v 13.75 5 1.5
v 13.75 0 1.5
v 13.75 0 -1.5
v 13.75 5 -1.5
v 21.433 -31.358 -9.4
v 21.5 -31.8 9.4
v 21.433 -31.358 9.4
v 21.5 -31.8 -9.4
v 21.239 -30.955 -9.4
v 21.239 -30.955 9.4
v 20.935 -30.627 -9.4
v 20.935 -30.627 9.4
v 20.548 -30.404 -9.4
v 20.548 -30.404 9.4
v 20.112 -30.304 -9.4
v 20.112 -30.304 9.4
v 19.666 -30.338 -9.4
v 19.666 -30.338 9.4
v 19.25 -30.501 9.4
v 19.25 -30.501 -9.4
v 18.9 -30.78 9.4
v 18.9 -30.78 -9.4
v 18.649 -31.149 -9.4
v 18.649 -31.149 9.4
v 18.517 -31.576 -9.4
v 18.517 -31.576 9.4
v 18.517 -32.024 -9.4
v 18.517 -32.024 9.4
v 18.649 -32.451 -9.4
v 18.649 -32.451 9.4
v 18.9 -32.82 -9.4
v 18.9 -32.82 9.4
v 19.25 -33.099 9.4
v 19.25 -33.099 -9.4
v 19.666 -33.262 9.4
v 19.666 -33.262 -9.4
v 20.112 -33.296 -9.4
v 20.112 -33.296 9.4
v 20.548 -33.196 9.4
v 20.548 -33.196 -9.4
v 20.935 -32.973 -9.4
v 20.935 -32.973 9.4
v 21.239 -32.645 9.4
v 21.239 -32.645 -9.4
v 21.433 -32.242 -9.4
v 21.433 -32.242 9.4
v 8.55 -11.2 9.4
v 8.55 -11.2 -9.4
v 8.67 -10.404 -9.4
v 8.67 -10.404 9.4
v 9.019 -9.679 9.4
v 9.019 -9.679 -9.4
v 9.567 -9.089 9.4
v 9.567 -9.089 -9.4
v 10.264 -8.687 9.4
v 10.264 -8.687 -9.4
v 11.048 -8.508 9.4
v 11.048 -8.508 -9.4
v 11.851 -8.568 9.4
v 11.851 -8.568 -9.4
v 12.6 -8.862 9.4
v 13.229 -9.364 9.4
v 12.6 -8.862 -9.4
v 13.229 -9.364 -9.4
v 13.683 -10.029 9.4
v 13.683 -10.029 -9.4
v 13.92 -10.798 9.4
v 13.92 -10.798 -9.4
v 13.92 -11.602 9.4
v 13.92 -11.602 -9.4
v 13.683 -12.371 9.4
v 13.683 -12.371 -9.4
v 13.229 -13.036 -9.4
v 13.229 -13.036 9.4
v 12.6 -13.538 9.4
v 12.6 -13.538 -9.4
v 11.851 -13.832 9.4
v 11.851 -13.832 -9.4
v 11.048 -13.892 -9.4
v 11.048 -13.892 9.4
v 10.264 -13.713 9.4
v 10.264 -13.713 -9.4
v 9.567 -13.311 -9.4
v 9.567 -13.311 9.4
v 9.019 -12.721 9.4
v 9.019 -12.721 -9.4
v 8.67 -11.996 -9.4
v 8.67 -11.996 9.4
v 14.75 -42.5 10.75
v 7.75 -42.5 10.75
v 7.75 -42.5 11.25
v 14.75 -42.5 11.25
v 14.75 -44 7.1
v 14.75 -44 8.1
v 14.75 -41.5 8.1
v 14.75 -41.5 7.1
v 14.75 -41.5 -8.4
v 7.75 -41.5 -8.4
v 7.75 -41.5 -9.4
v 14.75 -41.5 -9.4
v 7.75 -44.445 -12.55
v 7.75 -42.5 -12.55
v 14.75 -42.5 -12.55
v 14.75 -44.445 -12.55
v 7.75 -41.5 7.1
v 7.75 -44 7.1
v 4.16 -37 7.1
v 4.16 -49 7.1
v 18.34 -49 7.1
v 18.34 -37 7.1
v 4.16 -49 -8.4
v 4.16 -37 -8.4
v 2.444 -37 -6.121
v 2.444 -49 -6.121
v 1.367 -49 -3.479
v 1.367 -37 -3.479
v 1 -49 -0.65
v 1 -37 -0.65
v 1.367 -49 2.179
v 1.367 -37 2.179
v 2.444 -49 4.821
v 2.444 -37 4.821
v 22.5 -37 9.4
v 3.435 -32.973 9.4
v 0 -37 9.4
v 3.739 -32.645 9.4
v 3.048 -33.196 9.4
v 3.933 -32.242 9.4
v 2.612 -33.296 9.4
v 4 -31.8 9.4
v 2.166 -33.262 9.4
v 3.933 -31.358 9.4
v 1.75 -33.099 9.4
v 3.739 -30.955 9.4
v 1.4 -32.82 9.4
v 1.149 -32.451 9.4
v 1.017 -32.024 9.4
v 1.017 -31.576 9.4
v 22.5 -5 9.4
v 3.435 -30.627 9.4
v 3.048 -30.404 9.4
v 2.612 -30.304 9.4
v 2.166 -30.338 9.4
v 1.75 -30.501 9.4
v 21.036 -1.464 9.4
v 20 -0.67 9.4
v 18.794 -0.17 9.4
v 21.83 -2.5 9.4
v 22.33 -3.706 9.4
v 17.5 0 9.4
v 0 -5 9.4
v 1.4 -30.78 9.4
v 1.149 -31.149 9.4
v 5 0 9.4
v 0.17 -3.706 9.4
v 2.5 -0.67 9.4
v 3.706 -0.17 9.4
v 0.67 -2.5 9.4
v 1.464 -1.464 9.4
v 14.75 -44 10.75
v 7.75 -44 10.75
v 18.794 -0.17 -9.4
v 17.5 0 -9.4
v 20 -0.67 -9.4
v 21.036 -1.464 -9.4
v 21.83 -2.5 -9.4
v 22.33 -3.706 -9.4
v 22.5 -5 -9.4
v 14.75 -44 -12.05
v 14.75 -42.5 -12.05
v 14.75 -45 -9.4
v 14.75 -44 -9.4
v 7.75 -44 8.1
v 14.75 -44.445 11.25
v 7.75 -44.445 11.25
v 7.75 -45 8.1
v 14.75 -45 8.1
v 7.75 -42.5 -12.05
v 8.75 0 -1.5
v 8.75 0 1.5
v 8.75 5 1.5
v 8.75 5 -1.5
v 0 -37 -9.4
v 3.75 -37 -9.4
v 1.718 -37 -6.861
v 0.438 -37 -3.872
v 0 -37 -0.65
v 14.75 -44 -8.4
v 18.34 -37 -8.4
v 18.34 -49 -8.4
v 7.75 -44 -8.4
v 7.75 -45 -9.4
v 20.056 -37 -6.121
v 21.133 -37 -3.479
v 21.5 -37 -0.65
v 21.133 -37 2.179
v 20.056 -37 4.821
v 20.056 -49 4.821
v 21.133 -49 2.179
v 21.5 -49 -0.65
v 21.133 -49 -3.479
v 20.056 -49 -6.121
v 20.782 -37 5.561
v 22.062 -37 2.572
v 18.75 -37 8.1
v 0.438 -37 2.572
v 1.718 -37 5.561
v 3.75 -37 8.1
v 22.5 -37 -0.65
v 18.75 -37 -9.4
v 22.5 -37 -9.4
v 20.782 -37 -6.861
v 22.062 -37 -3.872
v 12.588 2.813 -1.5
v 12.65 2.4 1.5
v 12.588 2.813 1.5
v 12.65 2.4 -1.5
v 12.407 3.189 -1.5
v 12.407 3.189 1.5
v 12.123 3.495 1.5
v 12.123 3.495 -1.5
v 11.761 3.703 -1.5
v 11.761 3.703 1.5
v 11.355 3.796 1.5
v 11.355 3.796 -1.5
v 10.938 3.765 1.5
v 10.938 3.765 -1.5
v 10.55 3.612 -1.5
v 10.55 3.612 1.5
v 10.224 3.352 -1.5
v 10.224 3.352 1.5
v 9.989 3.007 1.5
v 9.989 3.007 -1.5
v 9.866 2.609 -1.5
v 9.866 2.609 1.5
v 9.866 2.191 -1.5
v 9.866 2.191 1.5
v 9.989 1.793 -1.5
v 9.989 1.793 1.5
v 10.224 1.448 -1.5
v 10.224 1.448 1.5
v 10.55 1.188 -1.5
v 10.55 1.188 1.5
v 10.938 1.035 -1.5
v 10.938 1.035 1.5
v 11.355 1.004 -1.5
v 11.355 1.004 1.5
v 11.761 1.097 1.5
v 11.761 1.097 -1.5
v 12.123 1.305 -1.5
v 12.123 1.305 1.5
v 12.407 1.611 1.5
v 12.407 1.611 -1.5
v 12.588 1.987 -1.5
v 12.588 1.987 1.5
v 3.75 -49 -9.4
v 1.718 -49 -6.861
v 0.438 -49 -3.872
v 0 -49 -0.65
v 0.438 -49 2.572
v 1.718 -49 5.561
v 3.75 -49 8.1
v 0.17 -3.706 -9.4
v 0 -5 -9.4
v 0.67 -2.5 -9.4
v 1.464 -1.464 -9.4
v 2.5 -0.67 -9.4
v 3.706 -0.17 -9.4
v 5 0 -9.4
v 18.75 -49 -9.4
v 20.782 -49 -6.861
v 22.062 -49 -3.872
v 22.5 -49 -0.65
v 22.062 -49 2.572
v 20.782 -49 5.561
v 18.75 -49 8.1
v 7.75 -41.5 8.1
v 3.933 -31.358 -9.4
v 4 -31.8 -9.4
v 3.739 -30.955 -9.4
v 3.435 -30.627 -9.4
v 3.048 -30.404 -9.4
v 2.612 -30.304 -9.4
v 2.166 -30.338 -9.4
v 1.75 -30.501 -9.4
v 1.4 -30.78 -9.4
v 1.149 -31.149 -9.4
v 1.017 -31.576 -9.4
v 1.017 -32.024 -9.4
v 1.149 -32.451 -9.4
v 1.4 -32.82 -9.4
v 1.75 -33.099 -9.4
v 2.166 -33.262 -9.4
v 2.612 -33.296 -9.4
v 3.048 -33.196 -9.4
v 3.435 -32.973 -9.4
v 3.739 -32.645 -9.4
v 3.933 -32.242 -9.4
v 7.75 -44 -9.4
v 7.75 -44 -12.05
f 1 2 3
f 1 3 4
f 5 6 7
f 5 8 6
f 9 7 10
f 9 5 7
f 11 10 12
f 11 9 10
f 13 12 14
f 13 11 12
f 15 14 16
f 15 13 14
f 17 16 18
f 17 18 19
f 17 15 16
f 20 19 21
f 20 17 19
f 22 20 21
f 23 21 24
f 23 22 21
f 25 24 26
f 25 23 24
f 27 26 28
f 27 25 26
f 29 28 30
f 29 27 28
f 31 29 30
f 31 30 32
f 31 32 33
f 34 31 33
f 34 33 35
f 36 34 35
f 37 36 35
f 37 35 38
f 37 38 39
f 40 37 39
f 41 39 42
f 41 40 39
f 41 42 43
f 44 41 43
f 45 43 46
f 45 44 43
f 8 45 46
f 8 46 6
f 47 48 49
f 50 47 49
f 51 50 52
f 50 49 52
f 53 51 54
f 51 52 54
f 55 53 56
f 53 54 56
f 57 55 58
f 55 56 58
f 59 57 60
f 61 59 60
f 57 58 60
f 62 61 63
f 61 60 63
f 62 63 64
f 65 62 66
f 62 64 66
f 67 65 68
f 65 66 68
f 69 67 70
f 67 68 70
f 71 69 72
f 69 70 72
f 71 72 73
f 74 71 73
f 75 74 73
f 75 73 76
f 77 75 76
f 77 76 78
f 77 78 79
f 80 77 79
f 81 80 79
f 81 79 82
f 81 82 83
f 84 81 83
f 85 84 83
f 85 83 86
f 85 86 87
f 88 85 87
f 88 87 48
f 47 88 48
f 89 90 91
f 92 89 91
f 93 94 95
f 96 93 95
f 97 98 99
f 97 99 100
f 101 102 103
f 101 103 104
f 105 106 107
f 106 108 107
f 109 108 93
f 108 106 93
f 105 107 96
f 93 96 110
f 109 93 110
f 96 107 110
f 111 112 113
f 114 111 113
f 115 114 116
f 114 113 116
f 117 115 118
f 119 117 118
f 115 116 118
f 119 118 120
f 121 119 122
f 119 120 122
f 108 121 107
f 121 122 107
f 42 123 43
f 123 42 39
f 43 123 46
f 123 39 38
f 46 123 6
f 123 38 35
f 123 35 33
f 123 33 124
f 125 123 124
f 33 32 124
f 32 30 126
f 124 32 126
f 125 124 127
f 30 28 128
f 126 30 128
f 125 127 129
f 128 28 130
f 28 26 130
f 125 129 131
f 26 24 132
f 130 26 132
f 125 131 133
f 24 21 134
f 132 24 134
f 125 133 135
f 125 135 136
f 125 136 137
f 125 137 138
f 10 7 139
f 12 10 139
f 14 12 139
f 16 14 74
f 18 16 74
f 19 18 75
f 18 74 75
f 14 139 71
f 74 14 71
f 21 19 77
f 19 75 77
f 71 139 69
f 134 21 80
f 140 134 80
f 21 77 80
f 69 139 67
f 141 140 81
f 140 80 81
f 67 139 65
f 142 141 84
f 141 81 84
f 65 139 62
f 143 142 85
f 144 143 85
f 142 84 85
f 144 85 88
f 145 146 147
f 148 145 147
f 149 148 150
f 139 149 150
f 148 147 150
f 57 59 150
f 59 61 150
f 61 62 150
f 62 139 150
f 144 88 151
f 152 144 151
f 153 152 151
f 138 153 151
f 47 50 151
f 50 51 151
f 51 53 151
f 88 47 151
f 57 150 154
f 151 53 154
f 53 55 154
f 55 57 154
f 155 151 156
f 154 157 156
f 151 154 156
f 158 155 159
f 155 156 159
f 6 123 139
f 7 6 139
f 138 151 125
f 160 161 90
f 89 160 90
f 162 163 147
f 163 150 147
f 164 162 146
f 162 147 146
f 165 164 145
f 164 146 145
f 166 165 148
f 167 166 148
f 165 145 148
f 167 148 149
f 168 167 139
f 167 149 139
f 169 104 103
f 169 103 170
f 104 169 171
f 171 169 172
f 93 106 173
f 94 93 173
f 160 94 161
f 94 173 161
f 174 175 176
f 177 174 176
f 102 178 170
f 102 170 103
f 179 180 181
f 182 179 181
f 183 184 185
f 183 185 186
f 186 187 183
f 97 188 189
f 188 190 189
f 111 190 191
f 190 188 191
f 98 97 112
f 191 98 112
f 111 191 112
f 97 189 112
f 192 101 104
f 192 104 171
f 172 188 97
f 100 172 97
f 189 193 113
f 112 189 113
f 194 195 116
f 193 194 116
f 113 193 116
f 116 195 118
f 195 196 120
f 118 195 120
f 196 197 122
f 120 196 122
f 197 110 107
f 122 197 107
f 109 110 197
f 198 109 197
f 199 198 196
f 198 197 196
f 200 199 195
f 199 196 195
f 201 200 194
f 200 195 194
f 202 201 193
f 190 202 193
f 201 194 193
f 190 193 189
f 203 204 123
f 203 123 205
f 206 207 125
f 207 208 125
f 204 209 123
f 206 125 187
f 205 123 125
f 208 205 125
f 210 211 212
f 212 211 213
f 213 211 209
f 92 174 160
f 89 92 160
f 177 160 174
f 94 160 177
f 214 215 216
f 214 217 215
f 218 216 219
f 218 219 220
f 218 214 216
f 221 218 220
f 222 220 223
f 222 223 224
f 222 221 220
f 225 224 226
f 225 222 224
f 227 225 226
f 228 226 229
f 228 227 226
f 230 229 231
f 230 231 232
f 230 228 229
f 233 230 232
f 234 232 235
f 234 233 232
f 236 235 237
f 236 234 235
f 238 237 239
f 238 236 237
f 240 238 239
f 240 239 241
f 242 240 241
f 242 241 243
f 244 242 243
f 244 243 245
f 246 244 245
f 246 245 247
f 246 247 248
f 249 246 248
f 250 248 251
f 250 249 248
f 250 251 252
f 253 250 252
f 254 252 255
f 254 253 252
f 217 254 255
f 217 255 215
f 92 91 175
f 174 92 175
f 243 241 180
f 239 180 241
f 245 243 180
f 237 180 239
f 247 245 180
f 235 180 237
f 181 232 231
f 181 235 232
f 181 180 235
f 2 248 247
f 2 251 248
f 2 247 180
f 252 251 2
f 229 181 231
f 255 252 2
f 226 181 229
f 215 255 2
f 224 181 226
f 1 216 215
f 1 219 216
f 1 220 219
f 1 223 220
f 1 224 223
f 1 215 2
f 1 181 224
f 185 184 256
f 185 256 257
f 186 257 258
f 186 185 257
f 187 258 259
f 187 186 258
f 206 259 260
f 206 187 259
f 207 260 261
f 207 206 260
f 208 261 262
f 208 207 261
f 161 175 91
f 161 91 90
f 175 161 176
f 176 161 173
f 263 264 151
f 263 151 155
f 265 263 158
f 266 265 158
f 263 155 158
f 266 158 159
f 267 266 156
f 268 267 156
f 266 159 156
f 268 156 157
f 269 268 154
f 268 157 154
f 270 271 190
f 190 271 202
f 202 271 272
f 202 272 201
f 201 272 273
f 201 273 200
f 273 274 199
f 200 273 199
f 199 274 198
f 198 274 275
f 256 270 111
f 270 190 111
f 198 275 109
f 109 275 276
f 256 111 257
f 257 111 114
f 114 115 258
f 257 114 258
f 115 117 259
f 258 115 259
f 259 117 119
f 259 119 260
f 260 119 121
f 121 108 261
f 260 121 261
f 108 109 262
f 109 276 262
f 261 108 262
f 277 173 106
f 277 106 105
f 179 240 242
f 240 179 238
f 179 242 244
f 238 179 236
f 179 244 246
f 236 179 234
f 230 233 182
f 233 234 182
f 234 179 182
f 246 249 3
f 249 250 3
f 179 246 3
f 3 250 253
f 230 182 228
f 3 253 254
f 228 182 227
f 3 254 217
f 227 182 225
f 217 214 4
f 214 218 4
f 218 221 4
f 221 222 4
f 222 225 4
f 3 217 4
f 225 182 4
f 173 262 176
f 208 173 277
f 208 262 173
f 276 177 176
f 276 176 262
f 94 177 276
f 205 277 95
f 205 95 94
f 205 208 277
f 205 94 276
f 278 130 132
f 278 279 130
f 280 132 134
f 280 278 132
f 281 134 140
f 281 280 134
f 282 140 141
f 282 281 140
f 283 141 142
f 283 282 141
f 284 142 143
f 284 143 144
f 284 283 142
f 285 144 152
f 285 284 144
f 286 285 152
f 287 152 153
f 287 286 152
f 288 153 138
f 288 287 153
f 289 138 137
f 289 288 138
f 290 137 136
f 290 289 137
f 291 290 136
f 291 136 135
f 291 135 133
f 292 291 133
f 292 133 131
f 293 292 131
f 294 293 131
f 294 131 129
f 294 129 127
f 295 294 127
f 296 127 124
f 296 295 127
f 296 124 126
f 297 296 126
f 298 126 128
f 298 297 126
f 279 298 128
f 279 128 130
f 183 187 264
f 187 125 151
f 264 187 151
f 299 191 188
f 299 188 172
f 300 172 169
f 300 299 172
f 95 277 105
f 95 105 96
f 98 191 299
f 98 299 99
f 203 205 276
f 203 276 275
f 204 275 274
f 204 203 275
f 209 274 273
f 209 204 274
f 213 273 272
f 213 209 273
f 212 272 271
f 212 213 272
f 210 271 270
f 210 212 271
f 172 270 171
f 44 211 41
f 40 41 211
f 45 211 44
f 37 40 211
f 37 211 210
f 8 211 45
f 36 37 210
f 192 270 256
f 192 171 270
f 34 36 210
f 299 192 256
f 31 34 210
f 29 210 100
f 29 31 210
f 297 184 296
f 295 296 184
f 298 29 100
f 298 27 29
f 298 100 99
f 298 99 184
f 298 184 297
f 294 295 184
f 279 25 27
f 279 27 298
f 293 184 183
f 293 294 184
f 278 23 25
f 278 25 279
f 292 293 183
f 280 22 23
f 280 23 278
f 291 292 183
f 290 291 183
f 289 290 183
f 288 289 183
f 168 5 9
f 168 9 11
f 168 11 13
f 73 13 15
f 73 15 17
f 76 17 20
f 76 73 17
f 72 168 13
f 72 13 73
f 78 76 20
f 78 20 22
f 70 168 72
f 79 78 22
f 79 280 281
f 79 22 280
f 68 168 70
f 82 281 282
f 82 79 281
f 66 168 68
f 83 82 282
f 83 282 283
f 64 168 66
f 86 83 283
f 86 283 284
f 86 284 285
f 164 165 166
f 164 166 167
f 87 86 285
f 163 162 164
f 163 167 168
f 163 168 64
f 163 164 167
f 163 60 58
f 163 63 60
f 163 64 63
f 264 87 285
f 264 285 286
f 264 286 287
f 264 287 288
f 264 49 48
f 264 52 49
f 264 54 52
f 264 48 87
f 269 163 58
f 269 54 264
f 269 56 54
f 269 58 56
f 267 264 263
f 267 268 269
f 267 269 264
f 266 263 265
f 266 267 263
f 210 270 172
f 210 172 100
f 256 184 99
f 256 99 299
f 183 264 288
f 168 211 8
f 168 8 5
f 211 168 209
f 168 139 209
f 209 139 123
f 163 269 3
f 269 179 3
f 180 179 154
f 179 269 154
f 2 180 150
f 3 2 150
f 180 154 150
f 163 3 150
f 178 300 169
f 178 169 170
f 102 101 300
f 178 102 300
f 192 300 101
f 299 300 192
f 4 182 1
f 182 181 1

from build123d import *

# Parameters (mm, degrees)
CROQUIS2_R              = 1.5
SALIENTE_EXTRUIR1_DEPTH = 9.4
CROQUIS3_W              = 5
CROQUIS3_H              = 5
CROQUIS3_R              = 1.4
SALIENTE_EXTRUIR2_DEPTH = 1.5
SALIENTE_EXTRUIR3_DEPTH = 12
CROQUIS6_W              = 7
CROQUIS6_H              = 2.5
CORTAR_EXTRUIR1_DEPTH   = 57.687741179
SALIENTE_EXTRUIR4_START = 7.75
SALIENTE_EXTRUIR4_DEPTH = 7
CROQUIS8_R              = 2.7
CORTAR_EXTRUIR2_DEPTH   = 58.737964114


with BuildPart() as part:
    # Croquis2 → Saliente-Extruir1 (new, symmetric)
    with BuildSketch(Plane.XY):
        with BuildLine():
            Line((5, 0), (17.5, 0))
            ThreePointArc((17.5, 0), (21.035533906, -1.464466094), (22.5, -5))
            Line((22.5, -5), (22.5, -37))
            Line((22.5, -37), (0, -37))
            Line((0, -37), (0, -5))
            ThreePointArc((0, -5), (1.464466094, -1.464466094), (5, 0))
        make_face()
        with Locations((2.5, -31.8)):
            Circle(CROQUIS2_R, mode=Mode.SUBTRACT)
        with Locations((20, -31.8)):
            Circle(CROQUIS2_R, mode=Mode.SUBTRACT)
    extrude(amount=SALIENTE_EXTRUIR1_DEPTH, both=True)

    # Croquis3 → Saliente-Extruir2 (add, symmetric)
    with BuildSketch(Plane.XY):
        with Locations((11.25, 2.5)):
            Rectangle(CROQUIS3_W, CROQUIS3_H)
        with Locations((11.25, 2.4)):
            Circle(CROQUIS3_R, mode=Mode.SUBTRACT)
    extrude(amount=SALIENTE_EXTRUIR2_DEPTH, both=True)

    # Croquis5 → Saliente-Extruir3 (add)
    with BuildSketch(Plane.XZ.offset(37)):
        with BuildLine():
            Line((18.75, -9.4), (3.75, -9.4))
            ThreePointArc((3.75, -9.4), (0, -0.65), (3.75, 8.1))
            Line((3.75, 8.1), (18.75, 8.1))
            ThreePointArc((18.75, 8.1), (22.5, -0.65), (18.75, -9.4))
        make_face()
        with BuildLine():
            Line((4.160090451, 7.1), (18.339909549, 7.1))
            ThreePointArc((18.339909549, 7.1), (21.5, -0.65), (18.339909549, -8.4))
            Line((18.339909549, -8.4), (4.160090451, -8.4))
            ThreePointArc((4.160090451, -8.4), (1, -0.65), (4.160090451, 7.1))
        make_face(mode=Mode.SUBTRACT)
    extrude(amount=SALIENTE_EXTRUIR3_DEPTH)

    # Croquis6 → Cortar-Extruir1 (cut, through all)
    with BuildSketch(Plane.XY.offset(8.1)):
        with Locations((11.25, -42.75)):
            Rectangle(CROQUIS6_W, CROQUIS6_H)
    extrude(amount=-CORTAR_EXTRUIR1_DEPTH, mode=Mode.SUBTRACT)

    # Croquis7 → Saliente-Extruir4 (add)
    with BuildSketch(Plane(origin=(0, 0, 0), x_dir=(0, 0, -1), z_dir=(1, 0, 0)).offset(SALIENTE_EXTRUIR4_START)):
        Polygon((-8.1, -44), (-10.75, -44), (-10.75, -42.5), (-11.25, -42.5), (-11.25, -44.444570011), (-8.1, -45), align=None)
    saliente_extruir4 = extrude(amount=SALIENTE_EXTRUIR4_DEPTH)

    # Simetría1: Saliente-Extruir4 across plane
    add(saliente_extruir4.mirror(Plane(origin=(0, 0, -0.65), x_dir=(1, 0, 0), z_dir=(0, 0, -1))))

    # Croquis8 → Cortar-Extruir2 (cut, through all)
    with BuildSketch(Plane(origin=(0, 0, -9.4), x_dir=(-1, 0, 0), z_dir=(0, 0, -1))):
        with Locations((-11.25, -11.2)):
            Circle(CROQUIS8_R)
    extrude(amount=-CORTAR_EXTRUIR2_DEPTH, mode=Mode.SUBTRACT)


solid = part.part
